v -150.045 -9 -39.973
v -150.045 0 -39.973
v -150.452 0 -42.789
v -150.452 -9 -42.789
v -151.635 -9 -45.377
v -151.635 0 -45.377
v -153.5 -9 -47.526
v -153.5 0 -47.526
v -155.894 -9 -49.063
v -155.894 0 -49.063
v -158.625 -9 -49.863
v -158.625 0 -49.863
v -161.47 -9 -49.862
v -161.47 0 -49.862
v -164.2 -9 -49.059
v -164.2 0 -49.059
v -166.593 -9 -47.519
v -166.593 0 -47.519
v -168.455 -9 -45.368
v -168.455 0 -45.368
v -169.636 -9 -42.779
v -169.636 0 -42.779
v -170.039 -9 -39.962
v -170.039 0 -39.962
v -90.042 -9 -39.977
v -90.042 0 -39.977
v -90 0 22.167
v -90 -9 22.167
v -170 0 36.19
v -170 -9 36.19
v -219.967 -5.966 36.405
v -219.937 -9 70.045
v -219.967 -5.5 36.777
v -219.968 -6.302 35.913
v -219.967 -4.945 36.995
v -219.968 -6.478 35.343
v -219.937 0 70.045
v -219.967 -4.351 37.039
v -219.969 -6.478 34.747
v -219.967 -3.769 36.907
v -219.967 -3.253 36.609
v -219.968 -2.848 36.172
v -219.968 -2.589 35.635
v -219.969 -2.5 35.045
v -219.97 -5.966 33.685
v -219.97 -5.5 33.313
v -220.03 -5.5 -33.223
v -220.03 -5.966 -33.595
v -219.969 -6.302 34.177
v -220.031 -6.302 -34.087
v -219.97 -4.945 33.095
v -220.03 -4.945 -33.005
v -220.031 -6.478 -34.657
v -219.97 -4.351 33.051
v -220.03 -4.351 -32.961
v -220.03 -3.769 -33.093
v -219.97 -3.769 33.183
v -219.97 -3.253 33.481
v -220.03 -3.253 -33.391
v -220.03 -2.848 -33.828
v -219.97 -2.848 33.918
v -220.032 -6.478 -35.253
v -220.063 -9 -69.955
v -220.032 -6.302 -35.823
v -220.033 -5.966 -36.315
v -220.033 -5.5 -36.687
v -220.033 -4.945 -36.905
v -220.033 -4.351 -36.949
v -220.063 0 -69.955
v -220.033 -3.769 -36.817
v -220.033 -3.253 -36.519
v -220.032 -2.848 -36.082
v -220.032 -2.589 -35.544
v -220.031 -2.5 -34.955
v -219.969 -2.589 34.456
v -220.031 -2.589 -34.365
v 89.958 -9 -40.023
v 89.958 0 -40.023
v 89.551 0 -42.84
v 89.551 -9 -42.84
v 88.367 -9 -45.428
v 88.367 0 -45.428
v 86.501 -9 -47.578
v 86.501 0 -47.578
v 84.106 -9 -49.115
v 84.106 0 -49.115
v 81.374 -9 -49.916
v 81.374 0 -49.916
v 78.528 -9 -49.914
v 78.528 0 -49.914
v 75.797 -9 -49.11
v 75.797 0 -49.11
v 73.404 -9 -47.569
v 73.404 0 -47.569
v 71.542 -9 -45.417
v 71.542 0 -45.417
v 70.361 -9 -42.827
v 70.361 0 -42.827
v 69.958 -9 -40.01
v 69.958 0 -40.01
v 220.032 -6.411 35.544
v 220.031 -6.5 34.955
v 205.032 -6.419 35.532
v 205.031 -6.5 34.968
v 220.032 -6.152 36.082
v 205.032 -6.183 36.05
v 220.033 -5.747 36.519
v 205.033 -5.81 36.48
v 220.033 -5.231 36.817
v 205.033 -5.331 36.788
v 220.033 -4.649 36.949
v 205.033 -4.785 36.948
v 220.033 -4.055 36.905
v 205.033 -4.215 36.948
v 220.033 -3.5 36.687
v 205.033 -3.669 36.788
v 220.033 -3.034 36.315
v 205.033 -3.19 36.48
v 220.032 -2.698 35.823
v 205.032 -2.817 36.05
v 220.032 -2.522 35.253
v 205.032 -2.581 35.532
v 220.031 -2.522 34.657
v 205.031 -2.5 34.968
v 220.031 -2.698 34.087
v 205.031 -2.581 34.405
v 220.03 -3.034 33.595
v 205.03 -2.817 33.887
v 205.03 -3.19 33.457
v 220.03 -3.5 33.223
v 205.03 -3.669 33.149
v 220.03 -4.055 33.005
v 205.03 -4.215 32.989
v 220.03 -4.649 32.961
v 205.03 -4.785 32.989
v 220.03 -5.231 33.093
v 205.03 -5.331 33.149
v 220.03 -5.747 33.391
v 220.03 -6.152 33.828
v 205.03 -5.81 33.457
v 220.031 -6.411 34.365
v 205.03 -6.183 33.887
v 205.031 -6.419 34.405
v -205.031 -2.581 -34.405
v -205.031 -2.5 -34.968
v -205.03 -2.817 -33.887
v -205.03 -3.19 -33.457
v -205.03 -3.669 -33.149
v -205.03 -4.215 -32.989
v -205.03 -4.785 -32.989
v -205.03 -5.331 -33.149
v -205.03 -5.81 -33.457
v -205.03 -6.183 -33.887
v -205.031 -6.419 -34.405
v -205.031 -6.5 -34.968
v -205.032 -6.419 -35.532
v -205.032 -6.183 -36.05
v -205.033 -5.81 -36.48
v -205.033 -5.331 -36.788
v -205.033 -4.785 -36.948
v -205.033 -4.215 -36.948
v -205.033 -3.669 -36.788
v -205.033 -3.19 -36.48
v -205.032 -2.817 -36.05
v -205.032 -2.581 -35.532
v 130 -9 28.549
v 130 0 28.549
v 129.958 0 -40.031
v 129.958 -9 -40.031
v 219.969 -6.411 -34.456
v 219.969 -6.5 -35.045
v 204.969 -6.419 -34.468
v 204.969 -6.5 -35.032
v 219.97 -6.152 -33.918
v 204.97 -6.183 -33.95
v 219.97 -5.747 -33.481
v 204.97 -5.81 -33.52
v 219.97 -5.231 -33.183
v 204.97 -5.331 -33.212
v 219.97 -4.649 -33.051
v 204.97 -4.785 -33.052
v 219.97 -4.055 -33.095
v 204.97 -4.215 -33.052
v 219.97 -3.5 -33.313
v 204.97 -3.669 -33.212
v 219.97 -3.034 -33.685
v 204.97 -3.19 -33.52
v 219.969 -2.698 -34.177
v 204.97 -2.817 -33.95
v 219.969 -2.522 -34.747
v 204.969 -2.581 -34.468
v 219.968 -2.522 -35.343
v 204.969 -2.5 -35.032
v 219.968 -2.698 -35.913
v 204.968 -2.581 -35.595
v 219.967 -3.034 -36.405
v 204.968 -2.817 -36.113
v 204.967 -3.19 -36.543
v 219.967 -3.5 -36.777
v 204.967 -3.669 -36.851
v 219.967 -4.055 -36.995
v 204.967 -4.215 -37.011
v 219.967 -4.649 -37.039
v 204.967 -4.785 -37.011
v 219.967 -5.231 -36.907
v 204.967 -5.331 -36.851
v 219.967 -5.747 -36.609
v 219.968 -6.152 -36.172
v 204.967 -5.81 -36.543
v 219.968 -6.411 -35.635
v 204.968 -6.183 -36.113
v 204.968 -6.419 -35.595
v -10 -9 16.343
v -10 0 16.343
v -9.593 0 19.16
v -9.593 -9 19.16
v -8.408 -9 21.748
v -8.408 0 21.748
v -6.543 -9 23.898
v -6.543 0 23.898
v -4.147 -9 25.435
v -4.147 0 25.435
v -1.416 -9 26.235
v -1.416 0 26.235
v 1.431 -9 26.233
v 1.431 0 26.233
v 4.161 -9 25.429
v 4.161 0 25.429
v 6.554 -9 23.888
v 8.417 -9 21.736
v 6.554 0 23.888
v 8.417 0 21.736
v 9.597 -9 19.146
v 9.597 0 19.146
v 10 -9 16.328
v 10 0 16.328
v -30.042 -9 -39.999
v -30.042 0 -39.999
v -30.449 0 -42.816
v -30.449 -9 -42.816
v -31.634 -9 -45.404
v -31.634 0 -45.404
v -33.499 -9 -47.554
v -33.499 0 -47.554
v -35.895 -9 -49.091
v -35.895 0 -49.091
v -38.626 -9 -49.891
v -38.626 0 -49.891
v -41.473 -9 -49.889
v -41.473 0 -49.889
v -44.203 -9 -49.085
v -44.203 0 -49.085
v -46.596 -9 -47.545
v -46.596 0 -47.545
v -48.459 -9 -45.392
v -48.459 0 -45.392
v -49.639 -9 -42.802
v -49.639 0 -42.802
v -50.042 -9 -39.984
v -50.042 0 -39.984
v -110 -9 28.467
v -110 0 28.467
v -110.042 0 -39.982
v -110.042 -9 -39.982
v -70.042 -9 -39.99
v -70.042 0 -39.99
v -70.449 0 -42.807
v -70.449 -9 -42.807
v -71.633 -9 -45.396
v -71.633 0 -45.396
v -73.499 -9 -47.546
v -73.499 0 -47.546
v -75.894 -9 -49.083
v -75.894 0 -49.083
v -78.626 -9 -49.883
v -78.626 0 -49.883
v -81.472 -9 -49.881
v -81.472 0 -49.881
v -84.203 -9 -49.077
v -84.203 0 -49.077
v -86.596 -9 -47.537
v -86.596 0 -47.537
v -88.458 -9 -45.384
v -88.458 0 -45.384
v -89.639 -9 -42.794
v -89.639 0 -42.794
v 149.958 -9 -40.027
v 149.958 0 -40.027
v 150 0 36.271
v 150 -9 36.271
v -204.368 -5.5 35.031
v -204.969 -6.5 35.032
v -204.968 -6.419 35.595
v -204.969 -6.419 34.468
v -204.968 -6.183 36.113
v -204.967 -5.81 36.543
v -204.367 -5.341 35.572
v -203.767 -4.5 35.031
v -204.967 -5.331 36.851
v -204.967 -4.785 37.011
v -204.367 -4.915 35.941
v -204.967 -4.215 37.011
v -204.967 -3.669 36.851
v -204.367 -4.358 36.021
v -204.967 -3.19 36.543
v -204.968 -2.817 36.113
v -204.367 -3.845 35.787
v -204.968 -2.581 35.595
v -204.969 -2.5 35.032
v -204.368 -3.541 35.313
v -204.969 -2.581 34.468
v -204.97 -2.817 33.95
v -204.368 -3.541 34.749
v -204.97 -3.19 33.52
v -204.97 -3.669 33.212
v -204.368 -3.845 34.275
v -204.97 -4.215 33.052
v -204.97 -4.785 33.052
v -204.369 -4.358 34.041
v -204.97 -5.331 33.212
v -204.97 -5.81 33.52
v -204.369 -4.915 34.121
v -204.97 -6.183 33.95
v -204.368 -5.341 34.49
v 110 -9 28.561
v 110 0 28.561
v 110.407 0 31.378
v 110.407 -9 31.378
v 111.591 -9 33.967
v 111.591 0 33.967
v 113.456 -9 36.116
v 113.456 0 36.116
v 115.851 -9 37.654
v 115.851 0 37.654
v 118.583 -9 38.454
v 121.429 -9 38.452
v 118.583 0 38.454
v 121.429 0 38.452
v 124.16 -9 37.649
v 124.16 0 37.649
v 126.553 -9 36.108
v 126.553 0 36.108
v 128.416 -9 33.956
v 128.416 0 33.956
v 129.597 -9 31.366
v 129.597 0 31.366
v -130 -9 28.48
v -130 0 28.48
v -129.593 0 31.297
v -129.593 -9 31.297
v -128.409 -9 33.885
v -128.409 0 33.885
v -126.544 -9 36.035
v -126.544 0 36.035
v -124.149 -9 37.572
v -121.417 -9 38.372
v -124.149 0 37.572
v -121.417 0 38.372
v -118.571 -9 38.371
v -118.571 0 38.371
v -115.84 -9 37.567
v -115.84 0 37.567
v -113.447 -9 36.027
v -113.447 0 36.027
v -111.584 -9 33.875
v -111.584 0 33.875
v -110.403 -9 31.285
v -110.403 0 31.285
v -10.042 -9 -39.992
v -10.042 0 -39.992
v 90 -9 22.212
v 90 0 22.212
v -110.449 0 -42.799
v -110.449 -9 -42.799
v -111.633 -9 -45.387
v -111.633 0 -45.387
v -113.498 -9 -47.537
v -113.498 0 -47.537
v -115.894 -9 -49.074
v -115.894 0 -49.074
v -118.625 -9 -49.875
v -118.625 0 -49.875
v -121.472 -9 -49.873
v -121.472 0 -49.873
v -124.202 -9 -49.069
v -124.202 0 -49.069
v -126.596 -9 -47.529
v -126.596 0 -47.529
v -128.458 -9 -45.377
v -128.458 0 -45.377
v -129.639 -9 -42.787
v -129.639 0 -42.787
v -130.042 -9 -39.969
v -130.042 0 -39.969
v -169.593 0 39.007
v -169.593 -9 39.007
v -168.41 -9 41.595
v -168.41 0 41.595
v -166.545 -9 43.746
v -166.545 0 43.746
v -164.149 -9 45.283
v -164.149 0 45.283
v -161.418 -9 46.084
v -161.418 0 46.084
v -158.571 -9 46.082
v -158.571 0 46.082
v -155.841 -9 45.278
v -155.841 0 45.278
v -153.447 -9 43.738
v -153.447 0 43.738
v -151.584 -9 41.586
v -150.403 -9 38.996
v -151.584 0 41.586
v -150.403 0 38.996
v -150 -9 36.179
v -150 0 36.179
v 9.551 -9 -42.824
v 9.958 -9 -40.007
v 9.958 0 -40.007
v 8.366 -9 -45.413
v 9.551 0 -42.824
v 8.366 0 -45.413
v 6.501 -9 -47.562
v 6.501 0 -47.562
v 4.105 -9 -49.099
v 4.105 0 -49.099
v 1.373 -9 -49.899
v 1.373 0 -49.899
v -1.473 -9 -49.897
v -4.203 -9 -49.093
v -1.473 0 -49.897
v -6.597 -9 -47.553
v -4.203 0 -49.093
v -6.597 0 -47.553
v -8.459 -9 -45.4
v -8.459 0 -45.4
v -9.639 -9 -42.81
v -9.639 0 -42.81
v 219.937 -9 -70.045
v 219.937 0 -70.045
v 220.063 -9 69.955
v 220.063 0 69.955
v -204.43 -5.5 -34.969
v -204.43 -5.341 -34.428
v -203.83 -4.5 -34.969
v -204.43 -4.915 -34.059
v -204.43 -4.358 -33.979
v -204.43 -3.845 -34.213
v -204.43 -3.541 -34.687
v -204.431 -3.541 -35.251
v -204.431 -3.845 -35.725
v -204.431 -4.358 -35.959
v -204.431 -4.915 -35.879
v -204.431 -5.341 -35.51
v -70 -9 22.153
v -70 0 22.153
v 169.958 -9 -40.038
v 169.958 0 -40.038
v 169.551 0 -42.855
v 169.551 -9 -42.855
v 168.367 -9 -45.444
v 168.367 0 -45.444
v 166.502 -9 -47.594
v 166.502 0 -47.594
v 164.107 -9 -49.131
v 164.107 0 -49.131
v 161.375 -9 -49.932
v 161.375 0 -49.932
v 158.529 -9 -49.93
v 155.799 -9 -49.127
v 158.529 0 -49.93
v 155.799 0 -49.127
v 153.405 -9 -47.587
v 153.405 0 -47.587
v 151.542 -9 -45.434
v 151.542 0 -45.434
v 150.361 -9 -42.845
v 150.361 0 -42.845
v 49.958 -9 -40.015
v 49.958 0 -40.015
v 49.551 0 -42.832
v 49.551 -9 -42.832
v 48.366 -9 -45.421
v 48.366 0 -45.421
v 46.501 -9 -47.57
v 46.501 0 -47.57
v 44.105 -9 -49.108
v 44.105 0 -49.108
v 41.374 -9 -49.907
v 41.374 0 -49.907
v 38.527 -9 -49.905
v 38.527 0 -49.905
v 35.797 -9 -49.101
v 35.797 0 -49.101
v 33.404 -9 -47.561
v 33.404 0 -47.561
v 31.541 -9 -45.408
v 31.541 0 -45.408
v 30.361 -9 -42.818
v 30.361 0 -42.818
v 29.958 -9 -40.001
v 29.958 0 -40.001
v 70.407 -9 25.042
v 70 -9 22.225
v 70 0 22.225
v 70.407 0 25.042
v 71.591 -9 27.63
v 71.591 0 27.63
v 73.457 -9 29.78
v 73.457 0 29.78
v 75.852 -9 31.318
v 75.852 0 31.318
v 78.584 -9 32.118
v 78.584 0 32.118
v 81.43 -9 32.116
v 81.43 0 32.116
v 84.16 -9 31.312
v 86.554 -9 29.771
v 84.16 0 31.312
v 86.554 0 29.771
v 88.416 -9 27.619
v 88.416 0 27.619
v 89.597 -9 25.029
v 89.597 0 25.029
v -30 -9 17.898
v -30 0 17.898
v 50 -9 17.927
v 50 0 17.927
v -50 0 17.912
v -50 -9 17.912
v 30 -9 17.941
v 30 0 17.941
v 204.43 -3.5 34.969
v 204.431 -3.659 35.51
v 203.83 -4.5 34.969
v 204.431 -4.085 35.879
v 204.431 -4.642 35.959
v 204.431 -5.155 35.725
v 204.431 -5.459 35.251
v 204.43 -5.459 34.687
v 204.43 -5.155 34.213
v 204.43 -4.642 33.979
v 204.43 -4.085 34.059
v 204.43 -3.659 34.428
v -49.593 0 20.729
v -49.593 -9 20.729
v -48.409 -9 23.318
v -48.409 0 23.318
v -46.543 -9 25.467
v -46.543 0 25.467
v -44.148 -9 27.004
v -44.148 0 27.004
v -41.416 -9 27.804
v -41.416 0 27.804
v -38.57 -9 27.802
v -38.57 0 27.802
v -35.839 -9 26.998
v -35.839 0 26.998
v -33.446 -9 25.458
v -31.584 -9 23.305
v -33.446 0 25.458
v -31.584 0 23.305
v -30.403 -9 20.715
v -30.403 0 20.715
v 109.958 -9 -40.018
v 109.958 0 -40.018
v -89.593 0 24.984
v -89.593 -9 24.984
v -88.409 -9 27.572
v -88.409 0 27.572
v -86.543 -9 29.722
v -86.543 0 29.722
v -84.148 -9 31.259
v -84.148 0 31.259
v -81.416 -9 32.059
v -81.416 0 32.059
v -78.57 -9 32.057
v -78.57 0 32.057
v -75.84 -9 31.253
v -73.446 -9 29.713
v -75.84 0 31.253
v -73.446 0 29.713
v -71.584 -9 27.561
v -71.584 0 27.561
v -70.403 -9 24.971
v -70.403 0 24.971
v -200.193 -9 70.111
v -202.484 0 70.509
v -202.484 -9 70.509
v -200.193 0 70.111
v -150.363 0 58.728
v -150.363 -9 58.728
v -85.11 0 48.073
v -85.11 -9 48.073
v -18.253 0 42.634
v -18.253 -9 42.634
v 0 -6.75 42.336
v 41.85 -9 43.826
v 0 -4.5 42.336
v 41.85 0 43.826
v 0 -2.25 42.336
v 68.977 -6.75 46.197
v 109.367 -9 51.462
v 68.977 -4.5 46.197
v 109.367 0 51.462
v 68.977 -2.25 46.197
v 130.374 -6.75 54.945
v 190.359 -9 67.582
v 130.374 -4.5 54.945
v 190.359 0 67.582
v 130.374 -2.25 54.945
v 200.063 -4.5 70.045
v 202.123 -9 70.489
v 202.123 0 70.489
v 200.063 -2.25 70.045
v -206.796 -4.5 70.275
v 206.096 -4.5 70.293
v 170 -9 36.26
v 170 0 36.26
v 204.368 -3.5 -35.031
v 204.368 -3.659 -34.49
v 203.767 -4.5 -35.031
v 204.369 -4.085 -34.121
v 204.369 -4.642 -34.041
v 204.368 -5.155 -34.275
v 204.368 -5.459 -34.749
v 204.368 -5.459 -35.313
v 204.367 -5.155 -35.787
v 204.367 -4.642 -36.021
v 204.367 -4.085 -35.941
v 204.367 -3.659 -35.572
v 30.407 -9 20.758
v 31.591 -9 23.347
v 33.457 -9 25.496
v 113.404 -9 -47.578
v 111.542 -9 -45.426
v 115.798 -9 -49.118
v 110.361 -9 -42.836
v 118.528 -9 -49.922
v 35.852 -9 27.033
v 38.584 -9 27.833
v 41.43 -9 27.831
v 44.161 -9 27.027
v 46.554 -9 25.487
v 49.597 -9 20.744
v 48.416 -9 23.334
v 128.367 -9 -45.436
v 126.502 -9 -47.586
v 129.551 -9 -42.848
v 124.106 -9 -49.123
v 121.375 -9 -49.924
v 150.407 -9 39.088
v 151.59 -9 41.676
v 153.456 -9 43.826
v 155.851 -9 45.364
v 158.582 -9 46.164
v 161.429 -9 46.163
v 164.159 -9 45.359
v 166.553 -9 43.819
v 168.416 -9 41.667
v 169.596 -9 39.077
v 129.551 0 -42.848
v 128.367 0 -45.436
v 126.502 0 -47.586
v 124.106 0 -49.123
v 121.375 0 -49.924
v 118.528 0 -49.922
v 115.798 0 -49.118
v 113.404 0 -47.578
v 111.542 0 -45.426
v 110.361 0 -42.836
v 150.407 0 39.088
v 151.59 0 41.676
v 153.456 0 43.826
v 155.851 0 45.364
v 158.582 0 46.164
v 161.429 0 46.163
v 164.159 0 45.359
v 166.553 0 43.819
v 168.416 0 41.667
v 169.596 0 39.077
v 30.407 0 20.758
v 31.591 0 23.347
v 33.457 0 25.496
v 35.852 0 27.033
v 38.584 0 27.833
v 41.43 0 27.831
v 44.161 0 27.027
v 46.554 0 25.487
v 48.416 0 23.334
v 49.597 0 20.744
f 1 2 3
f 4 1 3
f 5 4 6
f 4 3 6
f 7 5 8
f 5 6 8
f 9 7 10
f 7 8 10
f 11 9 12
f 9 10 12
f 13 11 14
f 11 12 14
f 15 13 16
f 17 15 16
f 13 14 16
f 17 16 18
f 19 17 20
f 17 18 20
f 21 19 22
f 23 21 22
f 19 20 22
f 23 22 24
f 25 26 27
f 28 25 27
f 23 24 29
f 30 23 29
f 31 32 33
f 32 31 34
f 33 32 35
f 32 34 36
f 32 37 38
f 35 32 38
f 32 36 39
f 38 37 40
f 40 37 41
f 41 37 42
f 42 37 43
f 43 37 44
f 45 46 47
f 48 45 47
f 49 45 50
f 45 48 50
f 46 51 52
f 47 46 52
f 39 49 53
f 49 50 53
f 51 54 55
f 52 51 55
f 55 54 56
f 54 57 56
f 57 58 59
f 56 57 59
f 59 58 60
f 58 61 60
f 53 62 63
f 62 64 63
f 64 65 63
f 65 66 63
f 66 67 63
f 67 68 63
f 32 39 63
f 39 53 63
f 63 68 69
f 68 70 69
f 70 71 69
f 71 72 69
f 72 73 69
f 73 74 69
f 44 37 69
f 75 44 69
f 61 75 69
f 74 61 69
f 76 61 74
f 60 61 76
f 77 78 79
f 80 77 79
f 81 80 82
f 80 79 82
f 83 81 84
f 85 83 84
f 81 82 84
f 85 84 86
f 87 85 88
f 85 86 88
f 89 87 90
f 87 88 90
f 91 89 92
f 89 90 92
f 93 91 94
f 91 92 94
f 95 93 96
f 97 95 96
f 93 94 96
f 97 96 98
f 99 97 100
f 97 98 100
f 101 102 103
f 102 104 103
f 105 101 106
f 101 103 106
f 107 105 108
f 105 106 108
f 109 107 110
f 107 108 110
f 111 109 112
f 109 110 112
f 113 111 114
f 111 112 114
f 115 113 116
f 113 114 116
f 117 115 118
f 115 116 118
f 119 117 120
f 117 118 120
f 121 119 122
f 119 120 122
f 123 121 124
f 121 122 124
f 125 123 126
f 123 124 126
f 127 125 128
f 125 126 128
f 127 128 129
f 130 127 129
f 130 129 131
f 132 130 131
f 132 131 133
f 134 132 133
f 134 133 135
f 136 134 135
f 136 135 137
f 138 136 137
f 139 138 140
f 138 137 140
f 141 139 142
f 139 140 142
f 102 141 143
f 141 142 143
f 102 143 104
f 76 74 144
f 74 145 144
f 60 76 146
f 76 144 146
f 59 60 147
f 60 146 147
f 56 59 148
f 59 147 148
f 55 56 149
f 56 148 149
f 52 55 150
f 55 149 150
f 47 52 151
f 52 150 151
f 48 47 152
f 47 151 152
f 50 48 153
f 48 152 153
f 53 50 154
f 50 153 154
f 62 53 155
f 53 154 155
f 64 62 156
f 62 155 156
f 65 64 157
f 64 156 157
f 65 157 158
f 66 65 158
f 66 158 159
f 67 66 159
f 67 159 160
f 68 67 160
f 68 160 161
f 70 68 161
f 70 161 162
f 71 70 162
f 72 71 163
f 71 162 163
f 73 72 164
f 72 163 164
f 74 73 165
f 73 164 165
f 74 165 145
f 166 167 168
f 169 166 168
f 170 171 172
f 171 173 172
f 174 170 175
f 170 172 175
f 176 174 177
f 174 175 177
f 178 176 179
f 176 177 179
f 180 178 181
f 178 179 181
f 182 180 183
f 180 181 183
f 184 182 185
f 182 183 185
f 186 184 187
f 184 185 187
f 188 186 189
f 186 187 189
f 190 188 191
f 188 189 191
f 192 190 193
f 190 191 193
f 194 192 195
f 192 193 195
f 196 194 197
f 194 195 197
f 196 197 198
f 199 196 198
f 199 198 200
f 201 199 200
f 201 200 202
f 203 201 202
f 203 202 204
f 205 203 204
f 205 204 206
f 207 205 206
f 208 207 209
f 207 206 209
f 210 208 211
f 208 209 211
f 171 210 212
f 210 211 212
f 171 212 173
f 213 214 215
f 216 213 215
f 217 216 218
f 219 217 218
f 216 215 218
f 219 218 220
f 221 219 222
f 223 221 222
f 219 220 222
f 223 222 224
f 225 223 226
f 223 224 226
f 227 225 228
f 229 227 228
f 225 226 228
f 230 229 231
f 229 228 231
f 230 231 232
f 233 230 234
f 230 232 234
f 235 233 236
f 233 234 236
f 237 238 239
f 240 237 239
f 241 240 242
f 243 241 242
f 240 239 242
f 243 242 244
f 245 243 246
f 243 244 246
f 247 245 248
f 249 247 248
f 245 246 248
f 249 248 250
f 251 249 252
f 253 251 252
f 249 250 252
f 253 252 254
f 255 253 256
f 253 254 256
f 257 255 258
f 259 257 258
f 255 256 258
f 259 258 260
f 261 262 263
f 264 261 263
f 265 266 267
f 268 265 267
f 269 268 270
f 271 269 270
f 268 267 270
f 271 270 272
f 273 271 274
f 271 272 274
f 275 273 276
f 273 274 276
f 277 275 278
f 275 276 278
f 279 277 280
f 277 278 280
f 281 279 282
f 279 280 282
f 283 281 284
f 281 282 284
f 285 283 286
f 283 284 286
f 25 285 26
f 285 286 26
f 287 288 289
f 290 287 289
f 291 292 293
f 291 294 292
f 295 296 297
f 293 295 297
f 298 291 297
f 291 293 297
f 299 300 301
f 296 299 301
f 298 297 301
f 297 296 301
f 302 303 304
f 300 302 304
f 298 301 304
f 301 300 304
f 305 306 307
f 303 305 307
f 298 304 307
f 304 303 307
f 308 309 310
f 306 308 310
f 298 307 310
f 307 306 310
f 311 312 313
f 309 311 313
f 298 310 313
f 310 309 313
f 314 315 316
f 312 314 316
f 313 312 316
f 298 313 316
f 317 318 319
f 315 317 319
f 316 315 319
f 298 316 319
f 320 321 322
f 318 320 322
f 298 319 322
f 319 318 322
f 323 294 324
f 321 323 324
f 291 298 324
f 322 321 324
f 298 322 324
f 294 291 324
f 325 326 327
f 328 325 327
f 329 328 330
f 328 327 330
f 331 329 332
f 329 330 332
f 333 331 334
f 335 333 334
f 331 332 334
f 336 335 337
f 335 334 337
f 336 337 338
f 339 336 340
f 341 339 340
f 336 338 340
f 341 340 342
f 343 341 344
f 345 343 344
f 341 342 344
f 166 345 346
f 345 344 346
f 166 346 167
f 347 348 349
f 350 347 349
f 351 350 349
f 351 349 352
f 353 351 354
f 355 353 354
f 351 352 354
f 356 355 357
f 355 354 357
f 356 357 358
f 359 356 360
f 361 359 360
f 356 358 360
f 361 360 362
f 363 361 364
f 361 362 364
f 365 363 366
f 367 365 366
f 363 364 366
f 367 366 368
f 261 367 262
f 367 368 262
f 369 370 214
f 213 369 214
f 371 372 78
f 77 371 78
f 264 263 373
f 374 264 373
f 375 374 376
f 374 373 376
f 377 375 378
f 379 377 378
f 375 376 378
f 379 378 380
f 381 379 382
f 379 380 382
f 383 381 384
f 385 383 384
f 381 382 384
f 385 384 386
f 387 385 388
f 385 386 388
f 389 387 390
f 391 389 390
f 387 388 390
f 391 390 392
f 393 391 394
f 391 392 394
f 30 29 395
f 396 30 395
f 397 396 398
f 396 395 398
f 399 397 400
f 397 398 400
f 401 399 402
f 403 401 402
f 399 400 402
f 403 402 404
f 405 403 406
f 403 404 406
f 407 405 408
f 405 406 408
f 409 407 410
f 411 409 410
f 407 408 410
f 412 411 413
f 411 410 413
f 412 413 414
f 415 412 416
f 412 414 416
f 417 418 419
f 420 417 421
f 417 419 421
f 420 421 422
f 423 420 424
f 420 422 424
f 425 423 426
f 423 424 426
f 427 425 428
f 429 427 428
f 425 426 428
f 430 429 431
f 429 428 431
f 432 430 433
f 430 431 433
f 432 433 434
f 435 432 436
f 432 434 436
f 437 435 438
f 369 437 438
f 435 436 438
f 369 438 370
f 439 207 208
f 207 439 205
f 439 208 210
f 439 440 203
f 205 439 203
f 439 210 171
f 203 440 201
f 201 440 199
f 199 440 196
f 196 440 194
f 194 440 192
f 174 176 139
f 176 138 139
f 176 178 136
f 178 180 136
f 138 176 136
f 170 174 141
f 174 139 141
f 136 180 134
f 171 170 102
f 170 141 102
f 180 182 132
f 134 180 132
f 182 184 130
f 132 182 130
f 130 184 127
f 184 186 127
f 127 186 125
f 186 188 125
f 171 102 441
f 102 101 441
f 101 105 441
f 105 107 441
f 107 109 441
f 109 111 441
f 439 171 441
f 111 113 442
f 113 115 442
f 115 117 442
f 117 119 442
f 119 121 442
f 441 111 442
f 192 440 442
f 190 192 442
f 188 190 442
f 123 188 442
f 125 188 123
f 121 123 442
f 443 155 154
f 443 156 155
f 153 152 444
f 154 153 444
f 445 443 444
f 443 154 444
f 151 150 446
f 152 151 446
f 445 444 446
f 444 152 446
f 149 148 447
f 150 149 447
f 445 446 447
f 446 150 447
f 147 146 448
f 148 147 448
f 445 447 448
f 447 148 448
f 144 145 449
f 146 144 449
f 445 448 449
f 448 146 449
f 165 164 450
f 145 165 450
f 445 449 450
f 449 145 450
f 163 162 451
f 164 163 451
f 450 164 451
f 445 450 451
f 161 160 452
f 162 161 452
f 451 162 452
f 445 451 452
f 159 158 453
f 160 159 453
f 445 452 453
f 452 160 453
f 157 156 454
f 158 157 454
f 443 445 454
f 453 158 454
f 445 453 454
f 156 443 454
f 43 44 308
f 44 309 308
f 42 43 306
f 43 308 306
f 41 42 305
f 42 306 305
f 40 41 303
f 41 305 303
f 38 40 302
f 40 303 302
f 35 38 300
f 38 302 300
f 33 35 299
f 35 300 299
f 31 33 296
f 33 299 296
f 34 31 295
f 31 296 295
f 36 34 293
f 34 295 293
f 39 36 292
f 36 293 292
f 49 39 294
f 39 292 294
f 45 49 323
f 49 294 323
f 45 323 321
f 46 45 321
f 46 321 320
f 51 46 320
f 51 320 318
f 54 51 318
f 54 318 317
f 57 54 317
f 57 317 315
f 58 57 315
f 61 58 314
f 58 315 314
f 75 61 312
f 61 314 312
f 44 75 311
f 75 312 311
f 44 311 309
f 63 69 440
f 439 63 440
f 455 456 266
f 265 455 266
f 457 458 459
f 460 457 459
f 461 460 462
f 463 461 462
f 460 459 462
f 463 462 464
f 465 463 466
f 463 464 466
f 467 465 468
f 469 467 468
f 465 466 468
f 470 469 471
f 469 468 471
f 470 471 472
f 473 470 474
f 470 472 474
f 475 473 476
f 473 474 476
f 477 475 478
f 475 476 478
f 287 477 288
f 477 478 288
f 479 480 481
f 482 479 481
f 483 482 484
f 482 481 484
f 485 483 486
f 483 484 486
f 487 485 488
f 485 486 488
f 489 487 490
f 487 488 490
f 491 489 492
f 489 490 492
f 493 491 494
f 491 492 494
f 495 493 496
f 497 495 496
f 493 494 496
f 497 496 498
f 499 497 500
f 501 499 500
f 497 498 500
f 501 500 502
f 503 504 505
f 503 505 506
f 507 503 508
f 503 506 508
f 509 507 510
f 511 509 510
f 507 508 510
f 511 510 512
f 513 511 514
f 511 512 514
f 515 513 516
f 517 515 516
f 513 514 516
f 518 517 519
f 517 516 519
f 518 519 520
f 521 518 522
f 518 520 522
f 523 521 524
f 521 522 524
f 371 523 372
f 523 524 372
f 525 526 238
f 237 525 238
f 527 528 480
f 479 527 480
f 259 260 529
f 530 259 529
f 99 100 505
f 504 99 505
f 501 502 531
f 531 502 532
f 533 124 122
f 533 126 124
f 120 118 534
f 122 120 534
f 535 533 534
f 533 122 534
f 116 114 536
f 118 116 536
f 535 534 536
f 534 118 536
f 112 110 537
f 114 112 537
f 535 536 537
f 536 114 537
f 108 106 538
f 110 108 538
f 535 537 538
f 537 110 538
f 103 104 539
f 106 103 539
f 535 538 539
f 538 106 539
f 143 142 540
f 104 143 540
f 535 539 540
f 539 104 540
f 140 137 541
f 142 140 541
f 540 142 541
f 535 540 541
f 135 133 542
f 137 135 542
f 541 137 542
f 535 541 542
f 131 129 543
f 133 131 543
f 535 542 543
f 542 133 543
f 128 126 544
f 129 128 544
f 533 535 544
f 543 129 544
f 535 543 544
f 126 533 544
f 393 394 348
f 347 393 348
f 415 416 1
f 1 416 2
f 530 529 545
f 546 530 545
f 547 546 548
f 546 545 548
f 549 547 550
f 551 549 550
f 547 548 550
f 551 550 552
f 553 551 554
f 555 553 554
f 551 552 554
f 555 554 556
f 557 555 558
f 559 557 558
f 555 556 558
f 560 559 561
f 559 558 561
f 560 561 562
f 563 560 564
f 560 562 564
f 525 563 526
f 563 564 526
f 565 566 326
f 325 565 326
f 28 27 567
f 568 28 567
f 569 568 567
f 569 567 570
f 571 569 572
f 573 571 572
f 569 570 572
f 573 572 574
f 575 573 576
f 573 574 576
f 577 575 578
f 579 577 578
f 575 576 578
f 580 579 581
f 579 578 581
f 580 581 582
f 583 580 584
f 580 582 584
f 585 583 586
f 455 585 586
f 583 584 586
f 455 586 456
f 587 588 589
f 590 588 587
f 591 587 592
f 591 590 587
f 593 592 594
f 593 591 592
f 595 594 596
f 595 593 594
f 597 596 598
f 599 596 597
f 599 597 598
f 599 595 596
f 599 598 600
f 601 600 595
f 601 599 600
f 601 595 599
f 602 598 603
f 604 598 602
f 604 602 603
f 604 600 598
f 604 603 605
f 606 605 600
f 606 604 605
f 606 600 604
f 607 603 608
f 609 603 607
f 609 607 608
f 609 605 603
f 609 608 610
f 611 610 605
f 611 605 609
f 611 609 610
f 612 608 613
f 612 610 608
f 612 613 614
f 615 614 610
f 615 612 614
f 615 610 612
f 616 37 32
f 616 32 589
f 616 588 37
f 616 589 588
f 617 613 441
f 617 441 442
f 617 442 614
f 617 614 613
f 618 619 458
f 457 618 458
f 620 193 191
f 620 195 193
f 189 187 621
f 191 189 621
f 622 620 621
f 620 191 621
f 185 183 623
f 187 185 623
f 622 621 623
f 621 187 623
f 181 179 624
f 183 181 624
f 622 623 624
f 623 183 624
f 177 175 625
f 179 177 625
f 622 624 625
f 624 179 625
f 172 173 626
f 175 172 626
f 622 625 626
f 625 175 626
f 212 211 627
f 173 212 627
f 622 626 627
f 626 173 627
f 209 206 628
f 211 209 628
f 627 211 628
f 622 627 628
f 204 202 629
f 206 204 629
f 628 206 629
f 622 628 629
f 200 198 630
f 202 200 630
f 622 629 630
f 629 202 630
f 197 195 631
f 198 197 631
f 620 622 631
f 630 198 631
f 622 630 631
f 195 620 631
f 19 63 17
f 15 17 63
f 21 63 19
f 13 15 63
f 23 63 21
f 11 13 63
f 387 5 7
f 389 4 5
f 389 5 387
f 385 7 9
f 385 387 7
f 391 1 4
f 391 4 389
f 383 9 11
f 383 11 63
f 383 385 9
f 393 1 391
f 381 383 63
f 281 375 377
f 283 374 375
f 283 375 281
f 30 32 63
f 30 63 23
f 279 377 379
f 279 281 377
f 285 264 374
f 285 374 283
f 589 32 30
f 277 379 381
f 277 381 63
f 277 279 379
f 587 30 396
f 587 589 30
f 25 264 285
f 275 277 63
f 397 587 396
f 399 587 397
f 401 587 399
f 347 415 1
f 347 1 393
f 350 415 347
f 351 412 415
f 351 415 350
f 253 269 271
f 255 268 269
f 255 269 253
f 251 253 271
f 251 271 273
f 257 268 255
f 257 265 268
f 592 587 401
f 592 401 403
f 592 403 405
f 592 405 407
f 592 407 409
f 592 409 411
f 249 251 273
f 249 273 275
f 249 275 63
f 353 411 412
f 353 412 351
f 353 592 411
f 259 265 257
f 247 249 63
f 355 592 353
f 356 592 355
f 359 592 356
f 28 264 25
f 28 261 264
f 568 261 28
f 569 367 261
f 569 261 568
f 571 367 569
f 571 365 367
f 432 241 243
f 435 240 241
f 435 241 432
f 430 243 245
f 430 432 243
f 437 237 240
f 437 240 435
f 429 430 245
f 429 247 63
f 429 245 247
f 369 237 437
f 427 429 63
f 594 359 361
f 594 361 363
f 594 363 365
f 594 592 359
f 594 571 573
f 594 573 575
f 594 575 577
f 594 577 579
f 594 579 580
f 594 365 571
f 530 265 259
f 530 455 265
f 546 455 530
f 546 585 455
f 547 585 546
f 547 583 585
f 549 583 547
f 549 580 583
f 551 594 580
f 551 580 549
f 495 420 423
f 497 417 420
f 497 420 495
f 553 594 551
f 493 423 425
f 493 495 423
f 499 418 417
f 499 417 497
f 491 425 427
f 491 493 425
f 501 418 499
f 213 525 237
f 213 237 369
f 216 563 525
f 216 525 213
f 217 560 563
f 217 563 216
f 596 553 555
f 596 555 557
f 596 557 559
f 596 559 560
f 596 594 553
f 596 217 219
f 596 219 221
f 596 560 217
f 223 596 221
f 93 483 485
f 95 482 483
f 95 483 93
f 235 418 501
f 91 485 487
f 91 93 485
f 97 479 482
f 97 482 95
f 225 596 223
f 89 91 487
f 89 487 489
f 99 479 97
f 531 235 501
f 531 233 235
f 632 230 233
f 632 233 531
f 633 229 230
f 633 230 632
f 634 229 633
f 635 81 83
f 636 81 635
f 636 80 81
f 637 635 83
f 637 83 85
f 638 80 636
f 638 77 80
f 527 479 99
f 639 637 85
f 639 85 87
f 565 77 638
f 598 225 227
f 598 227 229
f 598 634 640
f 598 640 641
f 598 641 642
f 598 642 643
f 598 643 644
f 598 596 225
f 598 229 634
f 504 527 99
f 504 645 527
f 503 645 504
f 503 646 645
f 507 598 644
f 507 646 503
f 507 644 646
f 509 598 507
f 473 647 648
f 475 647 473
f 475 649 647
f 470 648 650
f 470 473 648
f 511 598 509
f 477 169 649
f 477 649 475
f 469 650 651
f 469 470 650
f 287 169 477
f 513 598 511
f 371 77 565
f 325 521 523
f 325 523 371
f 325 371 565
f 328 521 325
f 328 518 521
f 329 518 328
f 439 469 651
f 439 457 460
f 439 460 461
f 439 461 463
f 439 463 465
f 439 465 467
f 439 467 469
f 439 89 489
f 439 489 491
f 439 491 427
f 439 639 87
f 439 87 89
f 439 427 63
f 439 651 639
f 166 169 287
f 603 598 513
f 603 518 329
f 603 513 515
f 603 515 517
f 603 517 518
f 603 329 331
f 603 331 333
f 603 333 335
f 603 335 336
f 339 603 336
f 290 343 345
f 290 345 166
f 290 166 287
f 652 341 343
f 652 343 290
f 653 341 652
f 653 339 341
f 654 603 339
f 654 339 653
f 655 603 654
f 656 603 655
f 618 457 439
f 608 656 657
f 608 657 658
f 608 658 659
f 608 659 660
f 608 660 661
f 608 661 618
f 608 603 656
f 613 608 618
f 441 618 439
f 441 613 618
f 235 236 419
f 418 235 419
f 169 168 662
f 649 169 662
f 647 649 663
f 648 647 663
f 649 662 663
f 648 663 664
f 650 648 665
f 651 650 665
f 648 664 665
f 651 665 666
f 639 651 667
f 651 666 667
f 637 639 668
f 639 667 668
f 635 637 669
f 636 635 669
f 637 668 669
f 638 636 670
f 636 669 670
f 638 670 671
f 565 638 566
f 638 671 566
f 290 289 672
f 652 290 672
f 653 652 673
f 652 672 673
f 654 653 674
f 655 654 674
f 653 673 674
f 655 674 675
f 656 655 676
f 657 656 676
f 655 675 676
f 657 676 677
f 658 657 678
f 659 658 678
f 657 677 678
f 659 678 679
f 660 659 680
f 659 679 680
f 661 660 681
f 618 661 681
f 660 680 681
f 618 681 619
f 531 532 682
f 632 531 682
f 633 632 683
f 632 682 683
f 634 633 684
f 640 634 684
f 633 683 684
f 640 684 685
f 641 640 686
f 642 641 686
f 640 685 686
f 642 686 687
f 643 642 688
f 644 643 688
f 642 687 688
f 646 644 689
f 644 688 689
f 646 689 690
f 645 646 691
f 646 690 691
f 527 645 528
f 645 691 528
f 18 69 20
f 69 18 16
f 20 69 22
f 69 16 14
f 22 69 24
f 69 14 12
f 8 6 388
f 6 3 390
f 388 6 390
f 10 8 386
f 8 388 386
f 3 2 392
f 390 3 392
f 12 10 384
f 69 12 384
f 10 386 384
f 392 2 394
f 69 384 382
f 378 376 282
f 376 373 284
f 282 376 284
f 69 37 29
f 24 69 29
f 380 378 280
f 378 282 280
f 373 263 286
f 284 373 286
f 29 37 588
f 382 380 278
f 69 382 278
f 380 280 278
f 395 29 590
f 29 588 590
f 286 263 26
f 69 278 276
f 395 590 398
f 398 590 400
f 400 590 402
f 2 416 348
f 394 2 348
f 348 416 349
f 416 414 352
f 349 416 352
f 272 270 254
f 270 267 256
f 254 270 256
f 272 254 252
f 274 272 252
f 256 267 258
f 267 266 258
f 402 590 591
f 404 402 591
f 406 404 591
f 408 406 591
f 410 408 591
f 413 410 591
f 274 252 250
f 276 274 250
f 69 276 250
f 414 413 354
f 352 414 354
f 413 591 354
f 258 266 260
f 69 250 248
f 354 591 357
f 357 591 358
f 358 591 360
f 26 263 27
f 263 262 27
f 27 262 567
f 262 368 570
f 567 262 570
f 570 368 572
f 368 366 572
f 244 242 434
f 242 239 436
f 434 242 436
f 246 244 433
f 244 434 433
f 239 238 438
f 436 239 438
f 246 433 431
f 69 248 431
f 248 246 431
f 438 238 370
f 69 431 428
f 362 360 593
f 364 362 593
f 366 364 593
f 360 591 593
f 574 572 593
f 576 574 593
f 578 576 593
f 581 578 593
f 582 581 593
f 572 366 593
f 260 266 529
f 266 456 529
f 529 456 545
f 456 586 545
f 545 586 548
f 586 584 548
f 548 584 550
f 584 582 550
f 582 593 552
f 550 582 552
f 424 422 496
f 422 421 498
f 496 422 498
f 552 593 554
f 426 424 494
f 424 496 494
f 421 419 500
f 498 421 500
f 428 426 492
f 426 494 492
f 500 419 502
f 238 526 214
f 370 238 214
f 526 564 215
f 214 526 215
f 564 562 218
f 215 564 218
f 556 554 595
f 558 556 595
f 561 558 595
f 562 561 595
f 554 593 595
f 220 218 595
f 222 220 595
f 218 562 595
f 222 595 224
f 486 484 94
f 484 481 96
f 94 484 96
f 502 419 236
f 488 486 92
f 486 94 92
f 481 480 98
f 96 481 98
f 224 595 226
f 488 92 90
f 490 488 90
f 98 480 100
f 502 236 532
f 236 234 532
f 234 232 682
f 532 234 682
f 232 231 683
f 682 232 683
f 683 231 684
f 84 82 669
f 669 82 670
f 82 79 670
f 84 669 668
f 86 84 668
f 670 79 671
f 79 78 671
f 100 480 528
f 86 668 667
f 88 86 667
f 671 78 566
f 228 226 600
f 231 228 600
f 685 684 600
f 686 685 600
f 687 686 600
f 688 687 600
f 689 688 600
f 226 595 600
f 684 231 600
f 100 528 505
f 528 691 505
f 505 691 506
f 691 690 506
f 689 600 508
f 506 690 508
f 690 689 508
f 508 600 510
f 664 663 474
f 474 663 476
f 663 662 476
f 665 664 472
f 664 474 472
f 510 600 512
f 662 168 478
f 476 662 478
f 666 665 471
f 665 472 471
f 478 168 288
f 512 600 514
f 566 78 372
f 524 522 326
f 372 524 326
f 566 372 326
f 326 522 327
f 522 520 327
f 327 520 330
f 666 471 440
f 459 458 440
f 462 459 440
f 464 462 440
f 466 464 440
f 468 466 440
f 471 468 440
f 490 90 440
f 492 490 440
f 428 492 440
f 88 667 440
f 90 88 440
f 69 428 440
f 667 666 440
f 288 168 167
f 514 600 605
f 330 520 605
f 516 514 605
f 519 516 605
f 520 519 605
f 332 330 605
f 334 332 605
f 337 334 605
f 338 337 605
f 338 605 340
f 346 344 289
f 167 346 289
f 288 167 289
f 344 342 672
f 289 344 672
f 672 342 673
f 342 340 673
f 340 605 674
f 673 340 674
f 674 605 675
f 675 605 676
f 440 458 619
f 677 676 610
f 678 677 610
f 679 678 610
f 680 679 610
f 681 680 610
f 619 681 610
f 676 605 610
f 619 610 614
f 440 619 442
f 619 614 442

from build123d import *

# Parameters (mm, degrees)
F1_DEPTH = 9
F3_D     = 4
F3_DEPTH = 15
F3_TIP   = 1.2017212381
F5_D     = 4
F5_DEPTH = 15
F5_TIP   = 1.2017212381


with BuildPart() as f1:
    # F0 (on Front) → F1 (new body)
    with BuildSketch(Plane.XZ):
        with BuildLine():
            Line((-220.0626368999, -69.9549353437), (219.9373538806, -70.0450085997))
            Line((219.9373538806, -70.0450085997), (220.0626368999, 69.9549353437))
            add(Edge.make_bspline(
                [(-219.9373538806, 70.0450085997), (-199.9373538806, 70.0450085997), (-216.6704655541, 74.4055250187), (-0.0007798551, 17.9431203918), (216.8058766507, 74.4053980204), (200.0626368999, 70.0450085992), (220.0626368999, 69.9549353437)],
                knots=[0, 0, 0, 0, 0.1196931891, 0.4999412608, 0.880306204, 1, 1, 1, 1], degree=3))
            Line((-219.9373538806, 70.0450085997), (-220.0626368999, -69.9549353437))
        make_face()
        with BuildLine():
            Line((-170.0393250498, -39.9620589055), (-169.9999986665, 36.1896787821))
            ThreePointArc((-169.9999986665, 36.1896787821), (-159.9944506903, 46.1845130295), (-150.0000017609, 36.1785801628))
            Line((-150.0000017609, 36.1785801628), (-150.0451933034, -39.9731542701))
            ThreePointArc((-150.0451933034, -39.9731542701), (-160.0478066453, -49.9642874845), (-170.0393250498, -39.9620589055))
        make_face(mode=Mode.SUBTRACT)
        with BuildLine():
            Line((-130.0422587333, -39.9692360273), (-129.9999980941, 28.4795169333))
            ThreePointArc((-129.9999980941, 28.4795169333), (-119.9938259458, 38.4733409731), (-110.0000019059, 28.4671688248))
            Line((-110.0000019059, 28.4671688248), (-110.0422625452, -39.9815841357))
            ThreePointArc((-110.0422625452, -39.9815841357), (-120.0484346935, -49.9754081755), (-130.0422587333, -39.9692360273))
        make_face(mode=Mode.SUBTRACT)
        with BuildLine():
            Line((-90.042260003, -39.9767977945), (-89.9999976875, 22.1666648469))
            ThreePointArc((-89.9999976875, 22.1666648469), (-79.9931992354, 32.1598617699), (-70.0000023125, 22.1530633178))
            Line((-70.0000023125, 22.1530633178), (-70.0422646281, -39.9903993236))
            ThreePointArc((-70.0422646281, -39.9903993236), (-80.0490630801, -49.9835962466), (-90.042260003, -39.9767977945))
        make_face(mode=Mode.SUBTRACT)
        with BuildLine():
            Line((-50.0422613274, -39.9844871548), (-49.9999973356, 17.9123129962))
            ThreePointArc((-49.9999973356, 17.9123129962), (-39.9927001181, 27.9050104499), (-30.0000026644, 17.8977132324))
            Line((-30.0000026644, 17.8977132324), (-30.0422666562, -39.9990869186))
            ThreePointArc((-30.0422666562, -39.9990869186), (-40.0495638737, -49.9917843723), (-50.0422613274, -39.9844871548))
        make_face(mode=Mode.SUBTRACT)
        with BuildLine():
            Line((-10.0422628538, -39.9924730545), (-9.9999971857, 16.3432583937))
            ThreePointArc((-9.9999971857, 16.3432583937), (0.0075024598, 26.3357531195), (9.9999971857, 16.328253474))
            Line((9.9999971857, 16.328253474), (9.9577315176, -40.0074779741))
            ThreePointArc((9.9577315176, -40.0074779741), (-0.0497681279, -49.9999726999), (-10.0422628538, -39.9924730545))
        make_face(mode=Mode.SUBTRACT)
        with BuildLine():
            Line((29.9577353163, -40.0008692622), (30.0000026607, 17.9414189994))
            ThreePointArc((30.0000026607, 17.9414189994), (40.0072947297, 27.934121609), (49.9999973393, 17.92682954))
            Line((49.9999973393, 17.92682954), (49.957729995, -40.0154587216))
            ThreePointArc((49.957729995, -40.0154587216), (39.9504379259, -50.0081613312), (29.9577353163, -40.0008692622))
        make_face(mode=Mode.SUBTRACT)
        with BuildLine():
            Line((69.9577332858, -40.0095606011), (70.0000023065, 22.2251711426))
            ThreePointArc((70.0000023065, 22.2251711426), (80.0067918684, 32.2183769677), (89.9999976935, 22.2115874058))
            Line((89.9999976935, 22.2115874058), (89.9577286729, -40.0231443379))
            ThreePointArc((89.9577286729, -40.0231443379), (79.9509391109, -50.016350163), (69.9577332858, -40.0095606011))
        make_face(mode=Mode.SUBTRACT)
        with BuildLine():
            Line((109.9577312027, -40.0183771938), (110.0000018996, 28.5610859215))
            ThreePointArc((110.0000018996, 28.5610859215), (120.0061637533, 38.5549202687), (129.9999981004, 28.548758415))
            Line((129.9999981004, 28.548758415), (129.9577274035, -40.0307047003))
            ThreePointArc((129.9577274035, -40.0307047003), (119.9515655498, -50.0245390475), (109.9577312027, -40.0183771938))
        make_face(mode=Mode.SUBTRACT)
        with BuildLine():
            Line((149.9577291616, -40.0271889989), (150.0000015348, 36.2708587226))
            ThreePointArc((150.0000015348, 36.2708587226), (160.0055404257, 46.2653167621), (169.9999984652, 36.2597778711))
            Line((169.9999984652, 36.2597778711), (169.957726092, -40.0382698504))
            ThreePointArc((169.957726092, -40.0382698504), (159.952187201, -50.0327278899), (149.9577291616, -40.0271889989))
        make_face(mode=Mode.SUBTRACT)
    extrude(amount=F1_DEPTH)

    # F3
    with Locations(Plane(origin=(-219.9998595148, 0, 0.1968732692), x_dir=(0, -1, 0), z_dir=(-0.9999995996, 0, 0.0008948787))):
        with Locations((4.5, 34.8481632979), (4.5, -35.1518367021)):
            Hole(F3_D / 2, depth=F3_DEPTH)
            with Locations((0, 0, -(F3_DEPTH + F3_TIP / 2))):  # 118° drill point
                Cone(0, F3_D / 2, F3_TIP, mode=Mode.SUBTRACT)

    # F5
    with Locations(Plane(origin=(219.9998595148, 0, -0.1968732692), x_dir=(0, 1, 0), z_dir=(0.9999995996, 0, -0.0008948787))):
        with Locations((-4.5, 35.1518367021), (-4.5, -34.8481632979)):
            Hole(F5_D / 2, depth=F5_DEPTH)
            with Locations((0, 0, -(F5_DEPTH + F5_TIP / 2))):  # 118° drill point
                Cone(0, F5_D / 2, F5_TIP, mode=Mode.SUBTRACT)


solid = f1.part
